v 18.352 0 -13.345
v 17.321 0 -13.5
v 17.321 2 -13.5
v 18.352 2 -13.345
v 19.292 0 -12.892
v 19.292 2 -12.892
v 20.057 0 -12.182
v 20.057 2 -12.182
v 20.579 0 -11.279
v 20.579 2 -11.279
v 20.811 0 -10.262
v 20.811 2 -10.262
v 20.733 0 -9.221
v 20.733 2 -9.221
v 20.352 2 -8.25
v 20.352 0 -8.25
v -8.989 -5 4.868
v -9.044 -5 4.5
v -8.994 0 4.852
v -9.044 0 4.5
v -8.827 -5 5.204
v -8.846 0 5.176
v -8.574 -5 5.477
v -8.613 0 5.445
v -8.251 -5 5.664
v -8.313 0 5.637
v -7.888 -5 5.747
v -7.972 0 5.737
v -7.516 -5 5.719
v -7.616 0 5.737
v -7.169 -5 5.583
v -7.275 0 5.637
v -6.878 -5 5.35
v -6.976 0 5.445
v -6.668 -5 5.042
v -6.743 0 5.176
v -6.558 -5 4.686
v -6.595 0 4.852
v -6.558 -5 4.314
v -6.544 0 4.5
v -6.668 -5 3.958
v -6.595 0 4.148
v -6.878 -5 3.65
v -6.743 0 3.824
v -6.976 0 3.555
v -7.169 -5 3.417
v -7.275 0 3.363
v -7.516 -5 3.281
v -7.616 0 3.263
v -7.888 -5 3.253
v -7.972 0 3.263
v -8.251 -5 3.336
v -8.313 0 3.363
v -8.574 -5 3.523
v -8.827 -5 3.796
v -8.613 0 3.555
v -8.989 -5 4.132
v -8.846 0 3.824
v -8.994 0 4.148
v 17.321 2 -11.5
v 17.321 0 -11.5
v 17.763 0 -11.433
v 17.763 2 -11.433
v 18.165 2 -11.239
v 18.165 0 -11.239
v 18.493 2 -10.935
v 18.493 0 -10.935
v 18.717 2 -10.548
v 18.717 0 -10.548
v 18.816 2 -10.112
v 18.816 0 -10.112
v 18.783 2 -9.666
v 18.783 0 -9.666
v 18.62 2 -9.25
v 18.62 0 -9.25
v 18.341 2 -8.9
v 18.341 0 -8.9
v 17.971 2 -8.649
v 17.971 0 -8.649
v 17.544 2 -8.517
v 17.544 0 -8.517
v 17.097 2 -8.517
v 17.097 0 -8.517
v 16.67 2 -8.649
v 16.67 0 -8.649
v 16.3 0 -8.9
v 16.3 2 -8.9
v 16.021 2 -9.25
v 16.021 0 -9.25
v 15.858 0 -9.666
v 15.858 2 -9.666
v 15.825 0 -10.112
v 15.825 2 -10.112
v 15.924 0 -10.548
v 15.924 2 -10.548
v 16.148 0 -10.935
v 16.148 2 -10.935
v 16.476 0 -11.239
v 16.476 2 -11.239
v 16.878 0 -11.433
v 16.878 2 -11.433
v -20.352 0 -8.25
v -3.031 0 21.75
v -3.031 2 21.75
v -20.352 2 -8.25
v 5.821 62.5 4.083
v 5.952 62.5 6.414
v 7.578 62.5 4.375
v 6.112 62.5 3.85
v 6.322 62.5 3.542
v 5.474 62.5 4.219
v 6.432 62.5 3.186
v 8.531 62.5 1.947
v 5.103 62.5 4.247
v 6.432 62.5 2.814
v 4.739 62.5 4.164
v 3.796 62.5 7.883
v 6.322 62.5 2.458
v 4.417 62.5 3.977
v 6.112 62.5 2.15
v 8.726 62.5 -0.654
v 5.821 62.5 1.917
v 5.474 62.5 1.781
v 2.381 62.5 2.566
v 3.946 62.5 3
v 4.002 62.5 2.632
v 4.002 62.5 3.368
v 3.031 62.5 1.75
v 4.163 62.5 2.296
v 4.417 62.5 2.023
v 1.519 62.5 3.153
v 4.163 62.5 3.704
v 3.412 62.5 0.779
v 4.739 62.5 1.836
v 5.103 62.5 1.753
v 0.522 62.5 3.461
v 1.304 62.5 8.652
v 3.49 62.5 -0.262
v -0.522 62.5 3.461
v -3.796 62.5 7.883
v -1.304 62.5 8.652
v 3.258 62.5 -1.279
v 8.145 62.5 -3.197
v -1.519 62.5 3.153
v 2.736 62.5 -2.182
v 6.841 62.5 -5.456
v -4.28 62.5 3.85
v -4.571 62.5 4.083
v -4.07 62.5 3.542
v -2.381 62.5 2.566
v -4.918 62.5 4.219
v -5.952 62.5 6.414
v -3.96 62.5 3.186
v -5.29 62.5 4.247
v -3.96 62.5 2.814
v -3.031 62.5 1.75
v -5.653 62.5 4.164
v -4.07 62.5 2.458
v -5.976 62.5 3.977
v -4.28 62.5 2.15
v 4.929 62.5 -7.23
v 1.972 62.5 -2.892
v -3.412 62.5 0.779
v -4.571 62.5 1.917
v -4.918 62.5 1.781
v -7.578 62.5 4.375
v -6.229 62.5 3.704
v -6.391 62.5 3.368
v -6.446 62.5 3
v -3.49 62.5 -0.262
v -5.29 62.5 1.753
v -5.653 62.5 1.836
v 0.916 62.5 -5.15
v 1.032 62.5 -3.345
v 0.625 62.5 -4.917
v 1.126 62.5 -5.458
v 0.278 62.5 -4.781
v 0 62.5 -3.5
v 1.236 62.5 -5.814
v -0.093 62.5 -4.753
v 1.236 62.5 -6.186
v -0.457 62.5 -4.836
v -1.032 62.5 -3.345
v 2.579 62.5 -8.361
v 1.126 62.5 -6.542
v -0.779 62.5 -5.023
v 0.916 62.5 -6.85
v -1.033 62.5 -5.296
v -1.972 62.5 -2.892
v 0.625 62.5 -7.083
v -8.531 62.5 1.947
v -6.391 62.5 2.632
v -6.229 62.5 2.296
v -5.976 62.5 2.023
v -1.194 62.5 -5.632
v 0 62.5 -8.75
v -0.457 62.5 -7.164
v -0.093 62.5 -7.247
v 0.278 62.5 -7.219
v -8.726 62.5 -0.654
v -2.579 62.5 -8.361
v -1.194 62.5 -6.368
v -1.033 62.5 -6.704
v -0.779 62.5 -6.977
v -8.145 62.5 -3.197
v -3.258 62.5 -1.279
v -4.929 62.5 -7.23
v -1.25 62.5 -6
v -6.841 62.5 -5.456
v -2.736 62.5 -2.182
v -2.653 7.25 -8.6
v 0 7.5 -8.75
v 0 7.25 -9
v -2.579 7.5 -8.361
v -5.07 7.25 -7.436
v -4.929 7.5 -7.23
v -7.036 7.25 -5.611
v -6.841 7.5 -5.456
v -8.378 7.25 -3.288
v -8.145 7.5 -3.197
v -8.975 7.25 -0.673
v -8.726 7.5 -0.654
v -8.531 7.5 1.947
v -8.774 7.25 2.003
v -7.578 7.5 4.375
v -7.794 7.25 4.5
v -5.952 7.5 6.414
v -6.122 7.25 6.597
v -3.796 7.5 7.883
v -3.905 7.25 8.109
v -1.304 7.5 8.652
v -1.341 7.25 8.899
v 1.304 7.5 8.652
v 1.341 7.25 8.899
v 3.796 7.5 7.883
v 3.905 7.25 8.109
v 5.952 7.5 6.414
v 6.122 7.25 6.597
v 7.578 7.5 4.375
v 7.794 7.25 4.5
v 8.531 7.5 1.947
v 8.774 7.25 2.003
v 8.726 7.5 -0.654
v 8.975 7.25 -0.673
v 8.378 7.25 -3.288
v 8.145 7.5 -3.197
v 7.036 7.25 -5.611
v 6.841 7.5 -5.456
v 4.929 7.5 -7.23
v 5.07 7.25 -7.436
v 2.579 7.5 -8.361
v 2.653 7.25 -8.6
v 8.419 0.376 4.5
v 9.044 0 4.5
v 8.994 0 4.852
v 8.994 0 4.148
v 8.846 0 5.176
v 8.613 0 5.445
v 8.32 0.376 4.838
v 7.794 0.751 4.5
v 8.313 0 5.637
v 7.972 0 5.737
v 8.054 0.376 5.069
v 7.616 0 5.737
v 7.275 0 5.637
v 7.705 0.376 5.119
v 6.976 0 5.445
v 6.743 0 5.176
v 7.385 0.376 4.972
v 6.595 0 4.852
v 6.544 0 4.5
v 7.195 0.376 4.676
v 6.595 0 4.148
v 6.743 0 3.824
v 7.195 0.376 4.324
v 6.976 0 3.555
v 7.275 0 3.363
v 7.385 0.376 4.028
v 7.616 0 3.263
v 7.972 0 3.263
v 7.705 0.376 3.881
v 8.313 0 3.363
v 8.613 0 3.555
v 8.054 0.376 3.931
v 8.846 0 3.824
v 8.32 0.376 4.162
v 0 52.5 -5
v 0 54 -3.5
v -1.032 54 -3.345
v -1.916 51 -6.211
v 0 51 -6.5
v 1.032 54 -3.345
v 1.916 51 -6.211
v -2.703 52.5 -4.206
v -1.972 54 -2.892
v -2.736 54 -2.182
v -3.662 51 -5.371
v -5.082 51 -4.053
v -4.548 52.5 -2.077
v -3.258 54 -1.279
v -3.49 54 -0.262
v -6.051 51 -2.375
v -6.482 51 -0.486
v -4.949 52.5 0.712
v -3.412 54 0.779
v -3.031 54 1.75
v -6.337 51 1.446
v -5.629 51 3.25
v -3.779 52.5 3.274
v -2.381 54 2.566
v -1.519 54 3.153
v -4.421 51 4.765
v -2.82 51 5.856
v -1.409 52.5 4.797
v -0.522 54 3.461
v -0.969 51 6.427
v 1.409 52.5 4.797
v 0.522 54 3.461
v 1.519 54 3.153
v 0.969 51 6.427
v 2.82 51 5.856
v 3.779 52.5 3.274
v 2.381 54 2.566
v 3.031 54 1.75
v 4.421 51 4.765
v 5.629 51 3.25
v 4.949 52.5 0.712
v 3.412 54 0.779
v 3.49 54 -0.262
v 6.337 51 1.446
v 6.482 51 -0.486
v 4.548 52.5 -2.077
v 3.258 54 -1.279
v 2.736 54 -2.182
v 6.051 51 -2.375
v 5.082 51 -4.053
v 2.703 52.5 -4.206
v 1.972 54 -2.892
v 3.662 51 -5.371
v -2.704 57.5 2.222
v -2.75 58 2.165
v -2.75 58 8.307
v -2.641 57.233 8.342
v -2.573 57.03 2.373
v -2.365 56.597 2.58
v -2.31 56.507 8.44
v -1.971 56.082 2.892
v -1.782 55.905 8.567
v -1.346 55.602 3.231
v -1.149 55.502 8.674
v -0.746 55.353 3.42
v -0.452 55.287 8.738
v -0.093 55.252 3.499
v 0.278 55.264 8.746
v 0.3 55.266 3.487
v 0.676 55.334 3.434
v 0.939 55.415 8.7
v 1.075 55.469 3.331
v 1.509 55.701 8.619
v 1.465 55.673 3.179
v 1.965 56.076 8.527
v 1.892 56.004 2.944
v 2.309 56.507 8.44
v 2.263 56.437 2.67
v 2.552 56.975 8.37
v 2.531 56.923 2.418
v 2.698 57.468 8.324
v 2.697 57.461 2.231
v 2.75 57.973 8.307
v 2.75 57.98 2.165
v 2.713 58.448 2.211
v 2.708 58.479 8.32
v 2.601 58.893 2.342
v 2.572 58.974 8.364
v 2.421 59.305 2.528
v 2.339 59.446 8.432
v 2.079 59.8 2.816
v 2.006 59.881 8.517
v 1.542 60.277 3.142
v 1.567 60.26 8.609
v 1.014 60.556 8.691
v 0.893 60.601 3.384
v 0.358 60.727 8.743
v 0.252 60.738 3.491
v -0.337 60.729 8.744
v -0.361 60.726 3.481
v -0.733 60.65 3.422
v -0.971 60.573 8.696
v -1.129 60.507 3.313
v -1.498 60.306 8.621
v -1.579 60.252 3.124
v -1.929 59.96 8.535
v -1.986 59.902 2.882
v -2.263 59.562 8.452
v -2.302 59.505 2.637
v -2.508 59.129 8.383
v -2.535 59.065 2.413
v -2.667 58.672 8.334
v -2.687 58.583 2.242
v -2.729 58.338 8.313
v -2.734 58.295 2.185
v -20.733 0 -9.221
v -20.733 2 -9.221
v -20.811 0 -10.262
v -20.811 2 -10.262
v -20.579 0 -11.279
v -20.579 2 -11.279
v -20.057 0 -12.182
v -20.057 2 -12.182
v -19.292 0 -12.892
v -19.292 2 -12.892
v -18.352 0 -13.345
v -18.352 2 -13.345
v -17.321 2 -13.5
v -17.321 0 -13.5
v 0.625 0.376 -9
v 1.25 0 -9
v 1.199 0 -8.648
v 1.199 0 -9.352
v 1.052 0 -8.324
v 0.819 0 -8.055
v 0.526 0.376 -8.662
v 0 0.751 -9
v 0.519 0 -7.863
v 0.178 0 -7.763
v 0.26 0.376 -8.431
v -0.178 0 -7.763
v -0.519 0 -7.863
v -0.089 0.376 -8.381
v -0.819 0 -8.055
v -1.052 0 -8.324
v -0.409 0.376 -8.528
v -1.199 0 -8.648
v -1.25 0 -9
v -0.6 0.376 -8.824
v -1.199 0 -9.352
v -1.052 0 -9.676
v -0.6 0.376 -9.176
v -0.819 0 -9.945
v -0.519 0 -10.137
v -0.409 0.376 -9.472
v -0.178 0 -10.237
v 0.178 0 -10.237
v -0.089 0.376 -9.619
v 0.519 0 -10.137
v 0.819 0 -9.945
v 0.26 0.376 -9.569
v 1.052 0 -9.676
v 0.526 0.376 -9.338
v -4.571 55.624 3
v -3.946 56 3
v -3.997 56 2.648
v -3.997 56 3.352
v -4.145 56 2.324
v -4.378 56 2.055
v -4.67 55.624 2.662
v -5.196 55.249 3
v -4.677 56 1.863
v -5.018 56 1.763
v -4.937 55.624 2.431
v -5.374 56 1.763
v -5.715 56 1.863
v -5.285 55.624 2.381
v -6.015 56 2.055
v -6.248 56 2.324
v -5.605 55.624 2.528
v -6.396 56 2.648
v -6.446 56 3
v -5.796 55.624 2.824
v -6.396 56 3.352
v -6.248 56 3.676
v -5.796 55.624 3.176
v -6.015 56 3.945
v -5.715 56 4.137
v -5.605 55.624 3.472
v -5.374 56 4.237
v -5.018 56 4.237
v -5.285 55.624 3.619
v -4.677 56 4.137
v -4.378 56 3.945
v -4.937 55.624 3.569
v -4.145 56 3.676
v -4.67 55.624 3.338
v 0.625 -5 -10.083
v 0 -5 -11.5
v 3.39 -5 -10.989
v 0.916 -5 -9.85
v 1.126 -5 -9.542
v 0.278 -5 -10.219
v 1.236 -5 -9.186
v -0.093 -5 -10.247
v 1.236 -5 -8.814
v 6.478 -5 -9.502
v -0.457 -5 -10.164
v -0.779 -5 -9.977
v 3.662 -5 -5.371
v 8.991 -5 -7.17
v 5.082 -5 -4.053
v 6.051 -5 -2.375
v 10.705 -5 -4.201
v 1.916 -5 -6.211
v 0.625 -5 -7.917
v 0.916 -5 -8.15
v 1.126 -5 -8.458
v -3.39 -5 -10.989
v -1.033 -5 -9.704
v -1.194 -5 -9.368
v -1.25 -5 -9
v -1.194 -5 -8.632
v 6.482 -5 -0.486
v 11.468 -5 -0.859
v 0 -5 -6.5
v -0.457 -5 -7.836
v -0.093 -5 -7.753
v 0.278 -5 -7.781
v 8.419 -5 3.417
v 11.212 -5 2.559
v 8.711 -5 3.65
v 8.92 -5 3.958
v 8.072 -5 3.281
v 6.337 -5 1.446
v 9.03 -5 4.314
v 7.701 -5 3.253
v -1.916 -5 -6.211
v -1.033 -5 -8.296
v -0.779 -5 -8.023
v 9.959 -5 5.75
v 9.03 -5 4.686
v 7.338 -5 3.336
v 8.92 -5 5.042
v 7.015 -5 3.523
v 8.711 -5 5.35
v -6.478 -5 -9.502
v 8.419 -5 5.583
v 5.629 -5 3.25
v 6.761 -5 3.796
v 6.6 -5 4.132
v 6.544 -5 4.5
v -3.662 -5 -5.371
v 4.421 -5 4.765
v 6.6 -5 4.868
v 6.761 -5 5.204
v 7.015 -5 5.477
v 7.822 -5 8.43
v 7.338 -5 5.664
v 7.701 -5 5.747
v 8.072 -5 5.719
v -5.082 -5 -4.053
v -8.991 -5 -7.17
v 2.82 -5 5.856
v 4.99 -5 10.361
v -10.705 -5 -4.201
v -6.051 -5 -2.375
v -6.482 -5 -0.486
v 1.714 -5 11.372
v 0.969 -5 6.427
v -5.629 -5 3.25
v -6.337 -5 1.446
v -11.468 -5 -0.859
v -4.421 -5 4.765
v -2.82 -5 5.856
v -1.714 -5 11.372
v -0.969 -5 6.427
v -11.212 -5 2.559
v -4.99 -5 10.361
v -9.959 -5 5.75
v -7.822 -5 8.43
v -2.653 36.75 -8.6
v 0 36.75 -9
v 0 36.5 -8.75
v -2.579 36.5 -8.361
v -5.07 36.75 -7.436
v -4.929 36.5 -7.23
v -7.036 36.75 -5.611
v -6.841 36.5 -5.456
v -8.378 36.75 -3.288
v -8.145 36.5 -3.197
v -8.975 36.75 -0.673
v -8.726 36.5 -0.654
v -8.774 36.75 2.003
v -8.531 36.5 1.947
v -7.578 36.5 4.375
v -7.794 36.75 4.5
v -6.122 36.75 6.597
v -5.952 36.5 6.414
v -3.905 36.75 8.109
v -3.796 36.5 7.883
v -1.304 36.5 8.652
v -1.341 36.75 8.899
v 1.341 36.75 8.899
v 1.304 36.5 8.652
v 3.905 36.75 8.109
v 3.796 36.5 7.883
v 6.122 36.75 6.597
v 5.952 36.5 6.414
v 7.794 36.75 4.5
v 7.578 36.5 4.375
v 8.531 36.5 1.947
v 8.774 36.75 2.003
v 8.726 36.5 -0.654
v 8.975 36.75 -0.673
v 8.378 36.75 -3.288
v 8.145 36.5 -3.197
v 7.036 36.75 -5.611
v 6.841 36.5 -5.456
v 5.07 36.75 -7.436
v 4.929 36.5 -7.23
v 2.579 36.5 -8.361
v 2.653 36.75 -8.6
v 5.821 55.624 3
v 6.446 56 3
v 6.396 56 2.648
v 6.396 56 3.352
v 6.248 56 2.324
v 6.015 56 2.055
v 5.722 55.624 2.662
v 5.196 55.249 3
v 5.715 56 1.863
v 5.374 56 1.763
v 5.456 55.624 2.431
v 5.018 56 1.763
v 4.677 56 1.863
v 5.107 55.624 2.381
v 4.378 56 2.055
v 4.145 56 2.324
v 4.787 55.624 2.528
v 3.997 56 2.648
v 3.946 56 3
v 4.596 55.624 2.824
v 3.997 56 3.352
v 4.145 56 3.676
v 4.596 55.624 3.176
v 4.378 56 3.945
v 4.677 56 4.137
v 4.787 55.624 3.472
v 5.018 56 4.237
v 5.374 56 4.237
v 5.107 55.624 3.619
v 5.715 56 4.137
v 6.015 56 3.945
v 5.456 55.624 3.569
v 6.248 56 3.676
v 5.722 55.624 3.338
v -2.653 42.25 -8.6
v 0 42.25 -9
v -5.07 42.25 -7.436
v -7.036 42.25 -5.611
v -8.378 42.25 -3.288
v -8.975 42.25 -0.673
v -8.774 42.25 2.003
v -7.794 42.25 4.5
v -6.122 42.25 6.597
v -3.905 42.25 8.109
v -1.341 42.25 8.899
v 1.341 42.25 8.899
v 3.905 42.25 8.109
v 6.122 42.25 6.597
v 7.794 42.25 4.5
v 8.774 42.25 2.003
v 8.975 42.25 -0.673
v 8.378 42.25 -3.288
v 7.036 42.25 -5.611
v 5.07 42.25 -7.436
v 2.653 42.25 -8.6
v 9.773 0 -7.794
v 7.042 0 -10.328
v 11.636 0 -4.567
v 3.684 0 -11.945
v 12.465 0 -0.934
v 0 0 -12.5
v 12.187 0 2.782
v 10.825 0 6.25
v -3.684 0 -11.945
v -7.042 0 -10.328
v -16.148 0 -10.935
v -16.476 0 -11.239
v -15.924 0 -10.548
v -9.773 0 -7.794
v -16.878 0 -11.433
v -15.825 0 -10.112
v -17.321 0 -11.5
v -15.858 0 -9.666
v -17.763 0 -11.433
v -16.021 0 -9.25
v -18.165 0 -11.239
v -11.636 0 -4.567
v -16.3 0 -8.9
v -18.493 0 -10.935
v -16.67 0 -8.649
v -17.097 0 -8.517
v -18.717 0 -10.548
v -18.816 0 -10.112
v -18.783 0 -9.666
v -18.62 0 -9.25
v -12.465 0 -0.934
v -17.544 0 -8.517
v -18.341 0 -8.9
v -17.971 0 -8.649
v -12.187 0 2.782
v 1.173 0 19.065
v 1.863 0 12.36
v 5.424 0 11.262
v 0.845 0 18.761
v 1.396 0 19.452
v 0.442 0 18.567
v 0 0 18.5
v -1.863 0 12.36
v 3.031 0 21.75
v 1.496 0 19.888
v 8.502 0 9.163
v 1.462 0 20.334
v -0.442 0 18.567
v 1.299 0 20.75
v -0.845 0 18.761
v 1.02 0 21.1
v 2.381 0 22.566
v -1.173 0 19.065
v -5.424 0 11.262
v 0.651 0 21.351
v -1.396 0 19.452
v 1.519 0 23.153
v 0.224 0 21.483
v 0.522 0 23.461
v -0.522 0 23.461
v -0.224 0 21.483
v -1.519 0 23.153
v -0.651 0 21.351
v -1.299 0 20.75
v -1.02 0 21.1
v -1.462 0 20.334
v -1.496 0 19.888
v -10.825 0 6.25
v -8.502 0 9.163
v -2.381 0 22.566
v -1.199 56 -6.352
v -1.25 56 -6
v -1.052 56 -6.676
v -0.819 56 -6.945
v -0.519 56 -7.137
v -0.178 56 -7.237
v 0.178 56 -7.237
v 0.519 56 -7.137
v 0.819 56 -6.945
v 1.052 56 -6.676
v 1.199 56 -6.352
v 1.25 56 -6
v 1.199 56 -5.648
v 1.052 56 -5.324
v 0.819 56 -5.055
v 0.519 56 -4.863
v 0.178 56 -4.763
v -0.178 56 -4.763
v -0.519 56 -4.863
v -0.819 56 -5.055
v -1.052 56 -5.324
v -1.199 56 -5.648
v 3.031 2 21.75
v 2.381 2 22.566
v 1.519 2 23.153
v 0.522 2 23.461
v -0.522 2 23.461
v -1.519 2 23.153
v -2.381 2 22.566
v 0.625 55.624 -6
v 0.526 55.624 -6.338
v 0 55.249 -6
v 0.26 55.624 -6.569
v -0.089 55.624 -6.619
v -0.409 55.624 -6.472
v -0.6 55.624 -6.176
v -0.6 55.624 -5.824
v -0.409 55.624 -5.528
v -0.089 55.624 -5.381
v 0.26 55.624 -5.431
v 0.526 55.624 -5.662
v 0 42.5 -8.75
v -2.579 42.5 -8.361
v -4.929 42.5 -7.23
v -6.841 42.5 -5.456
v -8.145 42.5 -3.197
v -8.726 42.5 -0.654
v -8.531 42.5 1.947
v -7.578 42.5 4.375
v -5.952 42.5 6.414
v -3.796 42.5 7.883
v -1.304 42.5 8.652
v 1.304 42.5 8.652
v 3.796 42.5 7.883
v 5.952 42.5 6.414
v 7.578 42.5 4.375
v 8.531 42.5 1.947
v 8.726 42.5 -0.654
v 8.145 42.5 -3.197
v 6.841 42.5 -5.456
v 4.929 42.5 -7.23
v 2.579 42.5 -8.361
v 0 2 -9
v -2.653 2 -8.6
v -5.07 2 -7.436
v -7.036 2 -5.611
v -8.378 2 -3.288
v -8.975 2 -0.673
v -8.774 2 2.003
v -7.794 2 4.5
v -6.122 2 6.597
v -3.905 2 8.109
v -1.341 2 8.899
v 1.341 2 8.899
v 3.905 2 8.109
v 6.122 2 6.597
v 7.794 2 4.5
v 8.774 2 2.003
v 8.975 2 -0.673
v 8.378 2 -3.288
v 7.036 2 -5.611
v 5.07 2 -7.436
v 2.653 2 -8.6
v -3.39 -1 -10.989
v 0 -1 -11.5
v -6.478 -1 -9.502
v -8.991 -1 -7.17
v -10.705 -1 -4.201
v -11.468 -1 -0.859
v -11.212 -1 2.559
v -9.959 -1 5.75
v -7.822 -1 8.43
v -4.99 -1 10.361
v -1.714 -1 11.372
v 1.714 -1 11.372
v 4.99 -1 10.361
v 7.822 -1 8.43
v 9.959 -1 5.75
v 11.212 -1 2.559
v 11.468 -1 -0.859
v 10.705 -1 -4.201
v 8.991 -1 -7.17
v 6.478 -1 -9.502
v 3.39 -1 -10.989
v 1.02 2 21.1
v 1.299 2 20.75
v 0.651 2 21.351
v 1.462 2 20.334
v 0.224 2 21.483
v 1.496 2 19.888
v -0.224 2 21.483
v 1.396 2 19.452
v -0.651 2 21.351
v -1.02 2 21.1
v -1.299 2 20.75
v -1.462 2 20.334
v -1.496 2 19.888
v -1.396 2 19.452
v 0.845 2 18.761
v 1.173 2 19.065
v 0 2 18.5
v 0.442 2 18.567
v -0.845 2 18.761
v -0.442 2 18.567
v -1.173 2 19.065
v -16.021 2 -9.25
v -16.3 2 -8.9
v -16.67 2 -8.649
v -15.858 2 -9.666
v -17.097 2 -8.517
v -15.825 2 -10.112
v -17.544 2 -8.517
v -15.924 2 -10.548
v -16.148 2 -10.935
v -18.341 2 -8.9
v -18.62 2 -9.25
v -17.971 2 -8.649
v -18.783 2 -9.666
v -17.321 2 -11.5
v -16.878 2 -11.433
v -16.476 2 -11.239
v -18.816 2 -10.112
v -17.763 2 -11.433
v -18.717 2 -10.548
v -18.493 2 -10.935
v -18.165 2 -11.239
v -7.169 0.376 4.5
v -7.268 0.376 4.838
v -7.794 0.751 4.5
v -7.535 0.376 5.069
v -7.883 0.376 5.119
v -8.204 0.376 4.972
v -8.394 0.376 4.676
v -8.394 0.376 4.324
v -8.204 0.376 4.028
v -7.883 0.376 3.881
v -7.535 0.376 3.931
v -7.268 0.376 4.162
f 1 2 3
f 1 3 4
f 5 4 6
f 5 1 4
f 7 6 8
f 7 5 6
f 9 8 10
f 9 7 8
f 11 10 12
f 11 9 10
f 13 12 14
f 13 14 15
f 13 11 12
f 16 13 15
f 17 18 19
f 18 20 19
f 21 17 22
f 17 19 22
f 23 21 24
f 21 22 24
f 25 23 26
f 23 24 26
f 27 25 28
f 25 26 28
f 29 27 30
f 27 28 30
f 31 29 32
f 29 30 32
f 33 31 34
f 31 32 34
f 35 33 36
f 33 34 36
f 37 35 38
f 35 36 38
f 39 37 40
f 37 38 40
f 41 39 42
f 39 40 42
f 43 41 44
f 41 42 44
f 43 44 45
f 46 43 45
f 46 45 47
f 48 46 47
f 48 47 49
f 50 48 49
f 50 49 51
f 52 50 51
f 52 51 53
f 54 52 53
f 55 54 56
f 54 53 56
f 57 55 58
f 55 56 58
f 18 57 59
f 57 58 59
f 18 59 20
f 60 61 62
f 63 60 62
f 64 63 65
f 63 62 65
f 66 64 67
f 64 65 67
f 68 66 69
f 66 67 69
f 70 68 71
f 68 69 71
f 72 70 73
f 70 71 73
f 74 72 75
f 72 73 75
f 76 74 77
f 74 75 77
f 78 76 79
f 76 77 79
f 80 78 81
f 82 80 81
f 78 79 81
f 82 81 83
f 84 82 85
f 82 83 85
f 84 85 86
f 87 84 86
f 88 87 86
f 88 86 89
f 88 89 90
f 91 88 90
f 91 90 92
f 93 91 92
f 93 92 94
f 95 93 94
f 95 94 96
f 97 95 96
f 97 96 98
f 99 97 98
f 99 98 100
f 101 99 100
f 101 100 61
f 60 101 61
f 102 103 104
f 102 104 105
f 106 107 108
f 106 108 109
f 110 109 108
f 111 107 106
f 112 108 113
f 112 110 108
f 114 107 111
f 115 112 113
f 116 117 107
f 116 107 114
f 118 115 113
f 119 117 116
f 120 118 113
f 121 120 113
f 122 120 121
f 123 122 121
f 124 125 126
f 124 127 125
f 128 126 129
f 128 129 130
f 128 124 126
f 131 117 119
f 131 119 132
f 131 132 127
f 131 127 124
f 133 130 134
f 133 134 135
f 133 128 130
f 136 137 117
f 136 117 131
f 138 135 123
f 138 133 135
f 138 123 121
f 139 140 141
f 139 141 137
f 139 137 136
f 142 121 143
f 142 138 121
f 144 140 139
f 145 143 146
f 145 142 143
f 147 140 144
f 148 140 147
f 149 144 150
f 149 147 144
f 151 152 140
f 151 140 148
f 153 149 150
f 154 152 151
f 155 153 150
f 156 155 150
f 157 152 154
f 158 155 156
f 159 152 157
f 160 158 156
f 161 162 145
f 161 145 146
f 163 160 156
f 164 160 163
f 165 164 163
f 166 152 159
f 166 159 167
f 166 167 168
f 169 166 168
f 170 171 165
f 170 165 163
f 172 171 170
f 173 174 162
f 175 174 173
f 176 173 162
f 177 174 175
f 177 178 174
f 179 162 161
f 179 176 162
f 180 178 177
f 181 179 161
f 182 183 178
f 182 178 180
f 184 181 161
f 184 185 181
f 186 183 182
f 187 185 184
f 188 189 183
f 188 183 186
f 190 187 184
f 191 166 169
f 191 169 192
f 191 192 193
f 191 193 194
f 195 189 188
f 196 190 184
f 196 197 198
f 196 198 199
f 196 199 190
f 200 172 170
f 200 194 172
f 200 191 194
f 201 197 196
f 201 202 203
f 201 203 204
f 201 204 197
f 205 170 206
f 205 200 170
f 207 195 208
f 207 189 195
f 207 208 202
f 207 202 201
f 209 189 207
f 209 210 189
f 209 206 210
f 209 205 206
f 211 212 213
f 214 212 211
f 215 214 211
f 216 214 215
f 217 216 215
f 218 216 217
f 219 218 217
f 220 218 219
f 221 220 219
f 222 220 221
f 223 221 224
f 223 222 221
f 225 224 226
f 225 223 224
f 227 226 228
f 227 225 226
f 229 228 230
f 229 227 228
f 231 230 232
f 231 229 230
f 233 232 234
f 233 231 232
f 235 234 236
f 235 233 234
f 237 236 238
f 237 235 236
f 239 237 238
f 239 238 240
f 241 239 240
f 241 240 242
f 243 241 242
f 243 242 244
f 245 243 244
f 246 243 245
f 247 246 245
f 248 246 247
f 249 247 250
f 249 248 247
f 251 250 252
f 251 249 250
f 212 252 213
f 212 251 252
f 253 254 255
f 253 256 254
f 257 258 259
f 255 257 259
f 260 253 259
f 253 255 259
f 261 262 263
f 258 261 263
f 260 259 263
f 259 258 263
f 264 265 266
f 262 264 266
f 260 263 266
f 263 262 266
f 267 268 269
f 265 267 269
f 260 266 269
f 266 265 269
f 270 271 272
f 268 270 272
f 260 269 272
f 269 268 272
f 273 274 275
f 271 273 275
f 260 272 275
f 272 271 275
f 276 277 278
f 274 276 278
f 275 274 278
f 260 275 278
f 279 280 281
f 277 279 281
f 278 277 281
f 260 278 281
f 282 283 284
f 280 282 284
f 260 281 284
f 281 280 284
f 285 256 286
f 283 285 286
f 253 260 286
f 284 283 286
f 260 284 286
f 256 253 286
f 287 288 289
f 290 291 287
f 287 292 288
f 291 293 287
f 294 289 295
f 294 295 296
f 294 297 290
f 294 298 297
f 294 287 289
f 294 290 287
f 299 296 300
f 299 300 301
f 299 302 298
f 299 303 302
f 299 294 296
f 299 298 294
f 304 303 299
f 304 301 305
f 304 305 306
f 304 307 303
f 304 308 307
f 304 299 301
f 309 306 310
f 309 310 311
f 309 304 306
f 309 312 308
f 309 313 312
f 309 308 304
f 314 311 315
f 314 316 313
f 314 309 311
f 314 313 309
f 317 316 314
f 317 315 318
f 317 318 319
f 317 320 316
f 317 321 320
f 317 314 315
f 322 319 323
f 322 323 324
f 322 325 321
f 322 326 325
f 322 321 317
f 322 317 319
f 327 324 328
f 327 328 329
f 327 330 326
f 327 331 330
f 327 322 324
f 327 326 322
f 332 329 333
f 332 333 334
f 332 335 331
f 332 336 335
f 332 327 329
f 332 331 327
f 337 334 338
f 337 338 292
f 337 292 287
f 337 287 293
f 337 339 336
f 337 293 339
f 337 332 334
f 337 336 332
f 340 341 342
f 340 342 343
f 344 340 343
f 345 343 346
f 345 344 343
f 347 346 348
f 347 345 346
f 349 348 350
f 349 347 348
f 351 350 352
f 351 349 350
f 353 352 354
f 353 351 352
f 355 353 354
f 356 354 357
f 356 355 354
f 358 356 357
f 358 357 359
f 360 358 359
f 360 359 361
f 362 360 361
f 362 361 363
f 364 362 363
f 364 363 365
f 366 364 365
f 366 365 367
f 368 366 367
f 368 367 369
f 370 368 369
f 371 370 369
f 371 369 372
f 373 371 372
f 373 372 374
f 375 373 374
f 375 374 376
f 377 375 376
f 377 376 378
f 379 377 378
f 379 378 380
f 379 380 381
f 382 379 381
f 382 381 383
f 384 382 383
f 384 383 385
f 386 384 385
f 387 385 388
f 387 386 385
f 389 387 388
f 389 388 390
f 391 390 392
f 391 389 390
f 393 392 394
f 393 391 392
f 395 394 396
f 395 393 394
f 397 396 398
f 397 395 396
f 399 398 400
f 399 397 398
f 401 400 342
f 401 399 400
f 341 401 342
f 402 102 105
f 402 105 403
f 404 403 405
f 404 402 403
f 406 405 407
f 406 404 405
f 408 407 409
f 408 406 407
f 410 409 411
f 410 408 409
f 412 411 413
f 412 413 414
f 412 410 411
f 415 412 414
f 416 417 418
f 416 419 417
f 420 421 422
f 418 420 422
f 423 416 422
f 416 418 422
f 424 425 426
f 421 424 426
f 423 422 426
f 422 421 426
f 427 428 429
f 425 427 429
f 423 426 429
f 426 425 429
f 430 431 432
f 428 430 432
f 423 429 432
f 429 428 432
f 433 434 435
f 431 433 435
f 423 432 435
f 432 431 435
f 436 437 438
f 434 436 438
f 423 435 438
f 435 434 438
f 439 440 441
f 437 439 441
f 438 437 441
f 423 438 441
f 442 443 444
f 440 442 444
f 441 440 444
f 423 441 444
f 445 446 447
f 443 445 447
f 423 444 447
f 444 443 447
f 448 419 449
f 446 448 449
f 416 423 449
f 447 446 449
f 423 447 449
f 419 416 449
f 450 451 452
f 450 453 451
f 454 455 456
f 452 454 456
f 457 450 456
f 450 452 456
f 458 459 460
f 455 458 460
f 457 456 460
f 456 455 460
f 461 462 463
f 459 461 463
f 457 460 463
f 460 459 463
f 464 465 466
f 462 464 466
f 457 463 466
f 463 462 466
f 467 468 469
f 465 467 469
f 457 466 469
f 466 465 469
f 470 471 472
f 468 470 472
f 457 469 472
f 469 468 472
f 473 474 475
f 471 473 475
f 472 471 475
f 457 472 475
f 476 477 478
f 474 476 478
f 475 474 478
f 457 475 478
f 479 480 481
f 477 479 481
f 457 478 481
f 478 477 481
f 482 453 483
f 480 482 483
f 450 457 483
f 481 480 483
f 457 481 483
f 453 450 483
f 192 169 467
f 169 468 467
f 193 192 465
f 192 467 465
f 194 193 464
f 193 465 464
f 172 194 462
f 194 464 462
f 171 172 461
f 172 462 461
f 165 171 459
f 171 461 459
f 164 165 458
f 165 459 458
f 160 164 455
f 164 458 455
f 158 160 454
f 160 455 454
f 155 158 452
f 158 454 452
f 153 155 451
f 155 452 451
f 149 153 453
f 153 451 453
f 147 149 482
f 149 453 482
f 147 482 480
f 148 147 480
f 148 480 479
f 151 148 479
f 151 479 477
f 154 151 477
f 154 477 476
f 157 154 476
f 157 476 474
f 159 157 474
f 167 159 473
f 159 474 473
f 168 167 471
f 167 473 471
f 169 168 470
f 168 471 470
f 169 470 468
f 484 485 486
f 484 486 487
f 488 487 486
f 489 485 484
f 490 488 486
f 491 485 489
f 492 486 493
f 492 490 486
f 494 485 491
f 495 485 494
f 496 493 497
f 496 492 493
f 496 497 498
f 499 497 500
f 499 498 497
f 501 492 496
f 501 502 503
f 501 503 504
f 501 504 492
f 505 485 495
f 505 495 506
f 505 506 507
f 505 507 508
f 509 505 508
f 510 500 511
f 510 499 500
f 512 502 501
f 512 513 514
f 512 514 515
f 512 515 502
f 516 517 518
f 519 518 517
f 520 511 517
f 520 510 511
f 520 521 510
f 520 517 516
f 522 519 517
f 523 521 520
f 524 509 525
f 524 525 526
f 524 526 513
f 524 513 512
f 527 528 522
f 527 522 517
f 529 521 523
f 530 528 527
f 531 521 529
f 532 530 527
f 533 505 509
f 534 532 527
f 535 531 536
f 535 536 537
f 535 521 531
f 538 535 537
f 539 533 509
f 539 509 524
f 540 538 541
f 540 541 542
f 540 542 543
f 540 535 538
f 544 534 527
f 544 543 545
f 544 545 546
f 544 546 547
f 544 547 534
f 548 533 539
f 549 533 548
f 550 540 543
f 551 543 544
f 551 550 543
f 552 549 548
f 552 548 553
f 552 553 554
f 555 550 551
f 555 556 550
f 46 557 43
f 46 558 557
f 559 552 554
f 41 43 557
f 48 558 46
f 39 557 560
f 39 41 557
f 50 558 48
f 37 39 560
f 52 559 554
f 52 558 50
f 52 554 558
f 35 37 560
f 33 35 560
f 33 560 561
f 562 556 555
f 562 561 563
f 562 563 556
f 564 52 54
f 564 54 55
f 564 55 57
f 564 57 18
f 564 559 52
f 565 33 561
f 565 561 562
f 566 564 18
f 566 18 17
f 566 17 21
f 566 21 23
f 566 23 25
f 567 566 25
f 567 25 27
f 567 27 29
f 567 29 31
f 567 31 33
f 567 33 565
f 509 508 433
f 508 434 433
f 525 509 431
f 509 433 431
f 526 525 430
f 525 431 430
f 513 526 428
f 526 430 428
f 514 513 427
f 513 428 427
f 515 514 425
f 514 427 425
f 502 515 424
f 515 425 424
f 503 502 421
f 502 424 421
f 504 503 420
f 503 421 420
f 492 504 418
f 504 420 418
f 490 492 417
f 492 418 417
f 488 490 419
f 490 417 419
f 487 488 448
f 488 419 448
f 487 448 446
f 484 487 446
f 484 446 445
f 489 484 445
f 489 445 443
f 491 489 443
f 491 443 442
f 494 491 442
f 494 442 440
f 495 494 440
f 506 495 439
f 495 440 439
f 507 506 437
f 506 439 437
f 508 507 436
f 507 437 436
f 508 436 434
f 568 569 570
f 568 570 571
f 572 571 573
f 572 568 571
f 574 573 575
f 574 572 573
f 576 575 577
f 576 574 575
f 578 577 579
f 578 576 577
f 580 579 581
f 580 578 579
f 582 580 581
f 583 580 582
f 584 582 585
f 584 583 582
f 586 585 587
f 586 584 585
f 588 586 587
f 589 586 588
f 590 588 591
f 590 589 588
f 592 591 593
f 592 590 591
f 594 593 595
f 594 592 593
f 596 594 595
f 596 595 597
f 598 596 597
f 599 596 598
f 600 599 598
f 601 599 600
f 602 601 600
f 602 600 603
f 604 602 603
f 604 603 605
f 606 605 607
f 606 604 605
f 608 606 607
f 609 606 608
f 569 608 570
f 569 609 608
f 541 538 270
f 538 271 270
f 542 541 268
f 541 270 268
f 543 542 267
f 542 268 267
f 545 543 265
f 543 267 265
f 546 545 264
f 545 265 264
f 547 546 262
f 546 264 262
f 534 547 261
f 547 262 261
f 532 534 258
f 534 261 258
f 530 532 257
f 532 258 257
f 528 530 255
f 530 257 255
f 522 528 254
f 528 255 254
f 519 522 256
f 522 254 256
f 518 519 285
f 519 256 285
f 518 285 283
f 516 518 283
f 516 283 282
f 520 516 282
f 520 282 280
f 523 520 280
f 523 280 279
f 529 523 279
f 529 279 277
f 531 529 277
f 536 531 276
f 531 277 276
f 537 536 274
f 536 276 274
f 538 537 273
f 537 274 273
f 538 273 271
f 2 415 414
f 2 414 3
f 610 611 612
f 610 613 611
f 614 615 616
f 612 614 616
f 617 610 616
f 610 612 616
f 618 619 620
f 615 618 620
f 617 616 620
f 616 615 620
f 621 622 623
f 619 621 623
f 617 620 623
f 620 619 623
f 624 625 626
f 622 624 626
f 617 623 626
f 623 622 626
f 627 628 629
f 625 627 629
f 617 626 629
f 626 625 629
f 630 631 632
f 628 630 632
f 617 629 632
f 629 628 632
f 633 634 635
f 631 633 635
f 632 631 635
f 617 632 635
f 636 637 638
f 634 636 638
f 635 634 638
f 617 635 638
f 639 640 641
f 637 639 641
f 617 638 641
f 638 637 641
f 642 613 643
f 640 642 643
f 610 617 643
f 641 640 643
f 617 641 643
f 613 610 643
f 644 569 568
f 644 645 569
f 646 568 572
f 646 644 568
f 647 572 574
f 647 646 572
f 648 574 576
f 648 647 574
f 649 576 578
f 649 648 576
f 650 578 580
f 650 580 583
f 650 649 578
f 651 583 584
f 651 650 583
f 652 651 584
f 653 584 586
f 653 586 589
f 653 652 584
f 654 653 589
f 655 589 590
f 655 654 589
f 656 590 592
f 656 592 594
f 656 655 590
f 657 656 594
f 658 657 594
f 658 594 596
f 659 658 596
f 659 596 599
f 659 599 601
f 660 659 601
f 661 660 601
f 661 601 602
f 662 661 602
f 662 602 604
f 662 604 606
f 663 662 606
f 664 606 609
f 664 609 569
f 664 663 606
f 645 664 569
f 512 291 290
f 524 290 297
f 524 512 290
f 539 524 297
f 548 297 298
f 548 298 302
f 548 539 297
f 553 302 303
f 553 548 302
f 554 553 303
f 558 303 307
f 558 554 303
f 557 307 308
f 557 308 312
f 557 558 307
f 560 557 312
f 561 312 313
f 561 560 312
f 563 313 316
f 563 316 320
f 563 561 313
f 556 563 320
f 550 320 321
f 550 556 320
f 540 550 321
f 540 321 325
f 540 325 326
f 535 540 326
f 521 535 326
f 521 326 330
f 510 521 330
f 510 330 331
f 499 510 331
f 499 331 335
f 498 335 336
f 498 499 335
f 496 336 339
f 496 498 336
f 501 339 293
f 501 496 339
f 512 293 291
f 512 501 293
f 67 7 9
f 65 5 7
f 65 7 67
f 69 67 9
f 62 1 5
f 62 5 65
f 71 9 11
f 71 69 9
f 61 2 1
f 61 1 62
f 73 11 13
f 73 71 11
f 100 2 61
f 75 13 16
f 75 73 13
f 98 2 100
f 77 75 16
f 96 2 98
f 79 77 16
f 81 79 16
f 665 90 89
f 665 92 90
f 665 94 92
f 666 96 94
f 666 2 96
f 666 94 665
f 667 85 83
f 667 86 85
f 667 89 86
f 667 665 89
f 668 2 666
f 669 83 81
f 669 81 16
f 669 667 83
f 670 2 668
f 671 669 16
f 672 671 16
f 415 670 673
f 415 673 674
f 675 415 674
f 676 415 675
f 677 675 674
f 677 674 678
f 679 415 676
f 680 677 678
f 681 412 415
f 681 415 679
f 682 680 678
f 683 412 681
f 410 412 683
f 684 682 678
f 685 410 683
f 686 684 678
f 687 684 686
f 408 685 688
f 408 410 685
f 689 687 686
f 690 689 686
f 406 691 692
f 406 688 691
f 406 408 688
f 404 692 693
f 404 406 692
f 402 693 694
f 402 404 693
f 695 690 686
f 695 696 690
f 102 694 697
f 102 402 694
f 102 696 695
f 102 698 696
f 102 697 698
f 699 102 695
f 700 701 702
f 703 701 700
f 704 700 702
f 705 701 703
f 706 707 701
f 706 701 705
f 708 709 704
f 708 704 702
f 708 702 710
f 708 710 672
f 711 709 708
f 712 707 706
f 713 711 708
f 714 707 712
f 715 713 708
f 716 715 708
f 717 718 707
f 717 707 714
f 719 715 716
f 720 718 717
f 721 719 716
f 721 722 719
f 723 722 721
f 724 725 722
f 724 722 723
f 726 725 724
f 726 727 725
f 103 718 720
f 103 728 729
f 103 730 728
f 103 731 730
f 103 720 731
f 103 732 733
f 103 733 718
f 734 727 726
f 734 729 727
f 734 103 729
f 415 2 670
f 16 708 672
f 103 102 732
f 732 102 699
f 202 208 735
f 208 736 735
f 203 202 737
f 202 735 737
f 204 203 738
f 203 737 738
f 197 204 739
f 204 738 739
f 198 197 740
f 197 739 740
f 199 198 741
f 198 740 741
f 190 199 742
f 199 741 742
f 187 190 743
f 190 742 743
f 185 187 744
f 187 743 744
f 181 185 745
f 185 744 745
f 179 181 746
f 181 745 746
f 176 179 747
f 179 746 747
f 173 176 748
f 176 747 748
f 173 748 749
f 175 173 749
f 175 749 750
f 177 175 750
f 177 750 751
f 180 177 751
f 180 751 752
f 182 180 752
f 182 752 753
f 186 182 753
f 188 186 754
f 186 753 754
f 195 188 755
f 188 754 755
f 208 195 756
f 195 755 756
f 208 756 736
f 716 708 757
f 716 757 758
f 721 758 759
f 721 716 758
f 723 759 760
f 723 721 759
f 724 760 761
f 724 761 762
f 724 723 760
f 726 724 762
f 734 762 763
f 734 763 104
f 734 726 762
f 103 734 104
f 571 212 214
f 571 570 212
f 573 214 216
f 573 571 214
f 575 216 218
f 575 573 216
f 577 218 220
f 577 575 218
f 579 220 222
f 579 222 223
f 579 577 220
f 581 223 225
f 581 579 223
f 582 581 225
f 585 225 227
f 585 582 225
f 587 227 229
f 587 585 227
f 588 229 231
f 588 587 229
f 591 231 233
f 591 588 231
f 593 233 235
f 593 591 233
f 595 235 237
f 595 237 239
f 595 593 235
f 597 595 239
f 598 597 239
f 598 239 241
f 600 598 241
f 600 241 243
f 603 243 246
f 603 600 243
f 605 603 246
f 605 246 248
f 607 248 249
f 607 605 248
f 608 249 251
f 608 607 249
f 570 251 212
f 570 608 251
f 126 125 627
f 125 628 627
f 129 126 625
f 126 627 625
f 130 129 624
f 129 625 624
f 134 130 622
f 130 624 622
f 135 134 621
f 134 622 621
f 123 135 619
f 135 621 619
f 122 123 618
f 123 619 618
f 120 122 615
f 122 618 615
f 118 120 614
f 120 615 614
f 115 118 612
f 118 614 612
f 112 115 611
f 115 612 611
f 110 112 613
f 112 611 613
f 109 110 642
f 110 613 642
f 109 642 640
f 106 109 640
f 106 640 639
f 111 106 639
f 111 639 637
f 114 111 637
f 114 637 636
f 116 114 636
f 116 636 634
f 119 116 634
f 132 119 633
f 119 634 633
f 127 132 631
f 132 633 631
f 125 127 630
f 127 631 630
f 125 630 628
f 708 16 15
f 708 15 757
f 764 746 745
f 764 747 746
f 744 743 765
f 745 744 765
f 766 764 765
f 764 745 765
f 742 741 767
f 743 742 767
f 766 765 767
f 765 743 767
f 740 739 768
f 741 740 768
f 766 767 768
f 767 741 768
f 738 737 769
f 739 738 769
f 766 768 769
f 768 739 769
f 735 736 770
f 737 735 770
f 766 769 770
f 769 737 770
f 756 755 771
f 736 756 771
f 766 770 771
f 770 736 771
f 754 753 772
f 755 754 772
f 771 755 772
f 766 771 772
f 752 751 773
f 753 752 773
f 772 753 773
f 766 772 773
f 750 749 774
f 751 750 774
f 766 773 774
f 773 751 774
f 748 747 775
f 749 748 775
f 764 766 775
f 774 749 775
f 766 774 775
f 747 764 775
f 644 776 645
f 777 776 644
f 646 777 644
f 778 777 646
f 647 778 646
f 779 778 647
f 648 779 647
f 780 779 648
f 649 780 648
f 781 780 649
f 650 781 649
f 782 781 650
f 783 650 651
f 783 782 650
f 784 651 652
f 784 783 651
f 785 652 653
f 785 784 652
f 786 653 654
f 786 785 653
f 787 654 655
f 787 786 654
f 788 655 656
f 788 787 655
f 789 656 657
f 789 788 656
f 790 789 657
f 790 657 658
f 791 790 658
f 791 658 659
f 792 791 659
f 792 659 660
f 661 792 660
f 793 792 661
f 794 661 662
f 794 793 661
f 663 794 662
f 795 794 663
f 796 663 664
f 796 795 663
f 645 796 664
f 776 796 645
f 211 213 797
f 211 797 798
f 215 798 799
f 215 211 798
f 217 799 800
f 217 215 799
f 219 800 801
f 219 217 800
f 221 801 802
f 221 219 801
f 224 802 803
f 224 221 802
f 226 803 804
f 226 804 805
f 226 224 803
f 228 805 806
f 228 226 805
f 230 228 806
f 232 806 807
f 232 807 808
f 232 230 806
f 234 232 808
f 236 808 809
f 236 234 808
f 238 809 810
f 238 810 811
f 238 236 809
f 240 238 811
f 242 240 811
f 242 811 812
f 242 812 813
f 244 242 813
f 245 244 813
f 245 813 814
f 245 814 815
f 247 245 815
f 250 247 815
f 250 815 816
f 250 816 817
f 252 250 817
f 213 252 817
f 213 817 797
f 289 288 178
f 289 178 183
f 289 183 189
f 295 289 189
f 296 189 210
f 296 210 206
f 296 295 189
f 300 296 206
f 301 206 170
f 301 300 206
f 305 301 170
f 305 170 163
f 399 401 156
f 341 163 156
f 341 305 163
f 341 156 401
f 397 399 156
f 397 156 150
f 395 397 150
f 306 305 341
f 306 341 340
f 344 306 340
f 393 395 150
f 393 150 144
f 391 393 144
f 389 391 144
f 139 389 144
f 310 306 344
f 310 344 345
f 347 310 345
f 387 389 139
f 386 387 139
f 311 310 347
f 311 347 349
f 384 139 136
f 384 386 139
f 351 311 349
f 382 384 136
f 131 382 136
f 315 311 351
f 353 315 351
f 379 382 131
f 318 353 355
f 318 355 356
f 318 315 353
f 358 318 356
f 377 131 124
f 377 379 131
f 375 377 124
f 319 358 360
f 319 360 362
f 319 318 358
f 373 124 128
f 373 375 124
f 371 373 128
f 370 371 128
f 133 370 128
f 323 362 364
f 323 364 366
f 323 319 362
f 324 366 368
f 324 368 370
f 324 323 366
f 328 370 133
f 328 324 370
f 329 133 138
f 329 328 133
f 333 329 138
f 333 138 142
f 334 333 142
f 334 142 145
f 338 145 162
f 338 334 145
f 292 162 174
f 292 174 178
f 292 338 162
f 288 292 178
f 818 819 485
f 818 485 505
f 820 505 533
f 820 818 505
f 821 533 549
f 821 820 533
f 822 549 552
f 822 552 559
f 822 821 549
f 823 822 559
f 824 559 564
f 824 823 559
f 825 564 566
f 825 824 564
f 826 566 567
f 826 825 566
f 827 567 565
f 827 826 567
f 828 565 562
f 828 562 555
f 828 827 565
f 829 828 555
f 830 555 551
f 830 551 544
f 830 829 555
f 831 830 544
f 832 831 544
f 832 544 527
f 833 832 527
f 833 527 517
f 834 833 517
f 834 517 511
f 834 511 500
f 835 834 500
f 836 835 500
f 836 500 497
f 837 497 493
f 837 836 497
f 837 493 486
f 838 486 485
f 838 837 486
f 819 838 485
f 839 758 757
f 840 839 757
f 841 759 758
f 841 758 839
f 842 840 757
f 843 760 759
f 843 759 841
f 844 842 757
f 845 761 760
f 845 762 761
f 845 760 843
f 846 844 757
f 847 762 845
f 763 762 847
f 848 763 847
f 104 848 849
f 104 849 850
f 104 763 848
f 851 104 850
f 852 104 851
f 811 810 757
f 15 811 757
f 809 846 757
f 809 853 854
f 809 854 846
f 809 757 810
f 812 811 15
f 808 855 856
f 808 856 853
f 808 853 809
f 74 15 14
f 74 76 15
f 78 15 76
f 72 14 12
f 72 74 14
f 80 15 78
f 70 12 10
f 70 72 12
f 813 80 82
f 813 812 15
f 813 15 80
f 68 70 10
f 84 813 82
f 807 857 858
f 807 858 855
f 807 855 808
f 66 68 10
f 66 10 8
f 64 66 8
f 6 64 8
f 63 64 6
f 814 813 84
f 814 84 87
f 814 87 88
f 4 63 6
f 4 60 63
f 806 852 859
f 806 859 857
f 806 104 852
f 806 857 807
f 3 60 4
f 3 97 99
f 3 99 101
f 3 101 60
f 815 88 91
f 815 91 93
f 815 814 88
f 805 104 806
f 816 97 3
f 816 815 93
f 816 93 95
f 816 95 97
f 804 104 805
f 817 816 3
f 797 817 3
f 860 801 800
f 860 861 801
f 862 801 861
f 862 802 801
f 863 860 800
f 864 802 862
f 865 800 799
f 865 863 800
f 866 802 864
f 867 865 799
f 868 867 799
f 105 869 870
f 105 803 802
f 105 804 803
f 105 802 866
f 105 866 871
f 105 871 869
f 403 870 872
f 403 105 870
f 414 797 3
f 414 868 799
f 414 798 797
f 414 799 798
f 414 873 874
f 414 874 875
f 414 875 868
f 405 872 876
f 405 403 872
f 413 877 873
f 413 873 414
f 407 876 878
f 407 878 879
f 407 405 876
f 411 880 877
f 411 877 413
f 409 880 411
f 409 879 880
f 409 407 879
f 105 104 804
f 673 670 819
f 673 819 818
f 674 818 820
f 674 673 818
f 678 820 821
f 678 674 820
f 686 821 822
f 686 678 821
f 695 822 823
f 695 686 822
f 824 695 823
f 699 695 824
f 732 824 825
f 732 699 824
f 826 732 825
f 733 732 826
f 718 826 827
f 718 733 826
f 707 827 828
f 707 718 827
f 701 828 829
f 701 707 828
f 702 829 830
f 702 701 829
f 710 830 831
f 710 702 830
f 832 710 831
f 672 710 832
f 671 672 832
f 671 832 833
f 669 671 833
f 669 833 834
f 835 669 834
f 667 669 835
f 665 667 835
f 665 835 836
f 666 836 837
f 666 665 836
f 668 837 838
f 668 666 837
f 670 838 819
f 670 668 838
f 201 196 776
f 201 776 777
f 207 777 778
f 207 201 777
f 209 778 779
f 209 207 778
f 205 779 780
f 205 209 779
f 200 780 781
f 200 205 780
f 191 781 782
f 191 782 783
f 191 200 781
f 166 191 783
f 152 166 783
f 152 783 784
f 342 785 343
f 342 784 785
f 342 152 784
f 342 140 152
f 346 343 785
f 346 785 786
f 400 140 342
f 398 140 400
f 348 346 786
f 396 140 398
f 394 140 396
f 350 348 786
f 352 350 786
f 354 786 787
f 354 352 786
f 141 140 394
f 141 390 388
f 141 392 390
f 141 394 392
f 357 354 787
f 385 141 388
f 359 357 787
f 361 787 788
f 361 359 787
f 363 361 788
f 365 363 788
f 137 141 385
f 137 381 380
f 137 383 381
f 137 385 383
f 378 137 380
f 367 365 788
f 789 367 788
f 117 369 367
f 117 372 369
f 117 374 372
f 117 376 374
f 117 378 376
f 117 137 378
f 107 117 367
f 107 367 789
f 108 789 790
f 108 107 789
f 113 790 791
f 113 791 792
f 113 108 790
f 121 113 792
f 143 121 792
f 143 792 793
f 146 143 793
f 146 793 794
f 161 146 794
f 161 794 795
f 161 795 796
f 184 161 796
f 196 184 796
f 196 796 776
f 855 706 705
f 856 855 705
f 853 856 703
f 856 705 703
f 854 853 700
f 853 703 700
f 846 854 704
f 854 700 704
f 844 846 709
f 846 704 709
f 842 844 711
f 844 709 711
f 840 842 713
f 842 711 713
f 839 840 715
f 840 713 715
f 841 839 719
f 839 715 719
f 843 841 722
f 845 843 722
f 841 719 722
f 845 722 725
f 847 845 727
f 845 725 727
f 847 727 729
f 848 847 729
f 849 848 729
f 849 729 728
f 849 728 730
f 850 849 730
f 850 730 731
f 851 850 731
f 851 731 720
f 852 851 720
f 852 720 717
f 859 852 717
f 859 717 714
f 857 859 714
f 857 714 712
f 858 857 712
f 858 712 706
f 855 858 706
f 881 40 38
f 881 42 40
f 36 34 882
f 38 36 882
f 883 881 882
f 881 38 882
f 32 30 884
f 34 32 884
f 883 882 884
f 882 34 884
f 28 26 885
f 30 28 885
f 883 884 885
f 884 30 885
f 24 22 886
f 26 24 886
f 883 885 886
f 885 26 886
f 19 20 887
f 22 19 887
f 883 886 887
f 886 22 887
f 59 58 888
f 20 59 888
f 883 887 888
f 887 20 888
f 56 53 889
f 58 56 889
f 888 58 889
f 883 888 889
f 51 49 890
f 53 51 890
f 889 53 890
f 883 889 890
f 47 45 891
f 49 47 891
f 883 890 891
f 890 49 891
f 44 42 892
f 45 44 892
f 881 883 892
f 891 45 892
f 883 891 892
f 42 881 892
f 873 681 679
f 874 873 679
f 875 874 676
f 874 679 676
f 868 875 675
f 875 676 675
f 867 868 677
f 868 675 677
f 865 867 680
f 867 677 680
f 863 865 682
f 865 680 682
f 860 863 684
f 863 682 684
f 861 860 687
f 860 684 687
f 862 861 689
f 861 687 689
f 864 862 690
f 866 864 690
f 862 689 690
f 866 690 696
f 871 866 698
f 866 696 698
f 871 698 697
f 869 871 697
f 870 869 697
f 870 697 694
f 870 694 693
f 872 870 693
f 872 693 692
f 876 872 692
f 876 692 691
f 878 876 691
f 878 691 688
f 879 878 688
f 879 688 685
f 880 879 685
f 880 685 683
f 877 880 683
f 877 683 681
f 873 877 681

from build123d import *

# Parameters (mm, degrees)
CHAMFER_1_SIZE         = 0.5
CHAMFER_2_SIZE         = 1
SKETCH_9_OUTSIDE_W     = 67.946
SKETCH_9_OUTSIDE_H     = 67.946
SKETCH_9_OUTSIDE_R     = 1.5
CUT_EXTRUDE_2_DEPTH    = 71.786651284
HOLE_WIZARD_M3_1_D     = 2.5
HOLE_WIZARD_M3_1_DEPTH = 5
HOLE_WIZARD_M3_1_TIP   = 0.751075774
HOLE_WIZARD_M3_2_D     = 2.5
HOLE_WIZARD_M3_2_DEPTH = 6.5
HOLE_WIZARD_M3_2_TIP   = 0.751075774
SKETCH_11_R            = 2.75
CUT_EXTRUDE_4_DEPTH    = 70.942787738


with BuildPart() as part:
    # 草图2 → 旋转1 (revolve)
    with BuildSketch(Plane.XY, mode=Mode.PRIVATE) as revolve_1_sk:
        Polygon((9, 2), (9, 7), (8.75, 7), (8.75, 37), (9, 37), (9, 42), (8.75, 42), (8.75, 62.5), (3.5, 62.5), (3.5, 54), (6.5, 51), (6.5, -5), (11.5, -5), (11.5, 0), (23.5, 0), (23.5, 2), align=None)
    revolve(revolve_1_sk.sketch.rotate(Axis((0, 0, 0), (0, 1, 0)), 90), axis=Axis((0, 0, 0), (0, 1, 0)))

    # 倒角1
    # the kernel refuses this chamfer: 0.5 mm, written as the material it adds along each edge
    with BuildSketch(Plane(origin=(0, 42, 0), x_dir=(0, 0, -1), z_dir=(1, 0, 0))) as chamfer_1_piece_1_section:
        Polygon((8.75 + CHAMFER_1_SIZE, 0), (8.75, CHAMFER_1_SIZE), (8.75, 0), align=None)
    chamfer_1_piece_1 = revolve(axis=Axis((0, 42, 0), (0, 1, 0)), mode=Mode.PRIVATE)
    chamfer_1_piece_1 = chamfer_1_piece_1 & Plane(origin=(0, 42.369448451, 0), x_dir=(0, 0, -1), z_dir=(0, 1, 0)) * Cylinder(9, 38, mode=Mode.PRIVATE)
    add(chamfer_1_piece_1)
    with BuildSketch(Plane(origin=(0, 37, 0), x_dir=(0, 0, -1), z_dir=(1, 0, 0))) as chamfer_1_piece_2_section:
        Polygon((8.75, -CHAMFER_1_SIZE), (8.75 + CHAMFER_1_SIZE, 0), (8.75, 0), align=None)
    chamfer_1_piece_2 = revolve(axis=Axis((0, 37, 0), (0, 1, 0)), mode=Mode.PRIVATE)
    chamfer_1_piece_2 = chamfer_1_piece_2 & Plane(origin=(0, 36.630551549, 0), x_dir=(0, 0, -1), z_dir=(0, 1, 0)) * Cylinder(9, 38, mode=Mode.PRIVATE)
    add(chamfer_1_piece_2)
    with BuildSketch(Plane(origin=(0, 7, 0), x_dir=(0, 0, -1), z_dir=(1, 0, 0))) as chamfer_1_piece_3_section:
        Polygon((8.75 + CHAMFER_1_SIZE, 0), (8.75, CHAMFER_1_SIZE), (8.75, 0), align=None)
    chamfer_1_piece_3 = revolve(axis=Axis((0, 7, 0), (0, 1, 0)), mode=Mode.PRIVATE)
    chamfer_1_piece_3 = chamfer_1_piece_3 & Plane(origin=(0, 7.369448451, 0), x_dir=(0, 0, -1), z_dir=(0, 1, 0)) * Cylinder(9, 38, mode=Mode.PRIVATE)
    add(chamfer_1_piece_3)

    # 倒角2
    chamfer_2_edges = [part.edges().sort_by_distance(p)[0] for p in [
        (0, 0, 11.5),
    ]]
    chamfer(chamfer_2_edges, length=CHAMFER_2_SIZE)

    # 草图9 outside → 切除-拉伸2 (cut, through all)
    # profile 1 of 4: a face of its own
    with BuildSketch(Plane.XZ):
        Rectangle(SKETCH_9_OUTSIDE_W, SKETCH_9_OUTSIDE_H)
        with BuildLine():
            Line((-3.031088913, 21.75), (-20.351596989, -8.25))
            ThreePointArc((-20.351596989, -8.25), (-20.351596989, -11.75), (-17.320508076, -13.5))
            Line((-17.320508076, -13.5), (17.320508076, -13.5))
            ThreePointArc((17.320508076, -13.5), (20.351596989, -11.75), (20.351596989, -8.25))
            Line((20.351596989, -8.25), (3.031088913, 21.75))
            ThreePointArc((3.031088913, 21.75), (0, 23.5), (-3.031088913, 21.75))
        make_face(mode=Mode.SUBTRACT)
    # profile 2 of 4: a face of its own
    with BuildSketch(Plane.XZ):
        with Locations(Location((0, 20, 0), (0, 0, 270))):
            Circle(SKETCH_9_OUTSIDE_R)
    # profile 3 of 4: a face of its own
    with BuildSketch(Plane.XZ):
        with Locations(Location((17.320508076, -10, 0), (0, 0, 270))):
            Circle(SKETCH_9_OUTSIDE_R)
    # profile 4 of 4: a face of its own
    with BuildSketch(Plane.XZ):
        with Locations(Location((-17.320508076, -10, 0), (0, 0, 270))):
            Circle(SKETCH_9_OUTSIDE_R)
    extrude(amount=-CUT_EXTRUDE_2_DEPTH, mode=Mode.SUBTRACT)

    # M3 螺纹孔1
    with Locations(Plane.XZ.offset(5)):
        with Locations((0, -9), (7.794228634, 4.5), (-7.794228634, 4.5)):
            Hole(HOLE_WIZARD_M3_1_D / 2, depth=HOLE_WIZARD_M3_1_DEPTH)
            with Locations((0, 0, -(HOLE_WIZARD_M3_1_DEPTH + HOLE_WIZARD_M3_1_TIP / 2))):  # 118° drill point
                Cone(0, HOLE_WIZARD_M3_1_D / 2, HOLE_WIZARD_M3_1_TIP, mode=Mode.SUBTRACT)

    # M3 螺纹孔2
    with Locations(Plane(origin=(0, 62.5, 0), x_dir=(1, 0, 0), z_dir=(0, 1, 0))):
        with Locations((0, 6), (5.196152423, -3), (-5.196152423, -3)):
            Hole(HOLE_WIZARD_M3_2_D / 2, depth=HOLE_WIZARD_M3_2_DEPTH)
            with Locations((0, 0, -(HOLE_WIZARD_M3_2_DEPTH + HOLE_WIZARD_M3_2_TIP / 2))):  # 118° drill point
                Cone(0, HOLE_WIZARD_M3_2_D / 2, HOLE_WIZARD_M3_2_TIP, mode=Mode.SUBTRACT)

    # 草图11 → 切除-拉伸4 (cut, through all)
    with BuildSketch(Plane.XY):
        with Locations(Location((0, 58, 0), (0, 0, 180))):
            Circle(SKETCH_11_R)
    extrude(amount=CUT_EXTRUDE_4_DEPTH, mode=Mode.SUBTRACT)


solid = part.part
